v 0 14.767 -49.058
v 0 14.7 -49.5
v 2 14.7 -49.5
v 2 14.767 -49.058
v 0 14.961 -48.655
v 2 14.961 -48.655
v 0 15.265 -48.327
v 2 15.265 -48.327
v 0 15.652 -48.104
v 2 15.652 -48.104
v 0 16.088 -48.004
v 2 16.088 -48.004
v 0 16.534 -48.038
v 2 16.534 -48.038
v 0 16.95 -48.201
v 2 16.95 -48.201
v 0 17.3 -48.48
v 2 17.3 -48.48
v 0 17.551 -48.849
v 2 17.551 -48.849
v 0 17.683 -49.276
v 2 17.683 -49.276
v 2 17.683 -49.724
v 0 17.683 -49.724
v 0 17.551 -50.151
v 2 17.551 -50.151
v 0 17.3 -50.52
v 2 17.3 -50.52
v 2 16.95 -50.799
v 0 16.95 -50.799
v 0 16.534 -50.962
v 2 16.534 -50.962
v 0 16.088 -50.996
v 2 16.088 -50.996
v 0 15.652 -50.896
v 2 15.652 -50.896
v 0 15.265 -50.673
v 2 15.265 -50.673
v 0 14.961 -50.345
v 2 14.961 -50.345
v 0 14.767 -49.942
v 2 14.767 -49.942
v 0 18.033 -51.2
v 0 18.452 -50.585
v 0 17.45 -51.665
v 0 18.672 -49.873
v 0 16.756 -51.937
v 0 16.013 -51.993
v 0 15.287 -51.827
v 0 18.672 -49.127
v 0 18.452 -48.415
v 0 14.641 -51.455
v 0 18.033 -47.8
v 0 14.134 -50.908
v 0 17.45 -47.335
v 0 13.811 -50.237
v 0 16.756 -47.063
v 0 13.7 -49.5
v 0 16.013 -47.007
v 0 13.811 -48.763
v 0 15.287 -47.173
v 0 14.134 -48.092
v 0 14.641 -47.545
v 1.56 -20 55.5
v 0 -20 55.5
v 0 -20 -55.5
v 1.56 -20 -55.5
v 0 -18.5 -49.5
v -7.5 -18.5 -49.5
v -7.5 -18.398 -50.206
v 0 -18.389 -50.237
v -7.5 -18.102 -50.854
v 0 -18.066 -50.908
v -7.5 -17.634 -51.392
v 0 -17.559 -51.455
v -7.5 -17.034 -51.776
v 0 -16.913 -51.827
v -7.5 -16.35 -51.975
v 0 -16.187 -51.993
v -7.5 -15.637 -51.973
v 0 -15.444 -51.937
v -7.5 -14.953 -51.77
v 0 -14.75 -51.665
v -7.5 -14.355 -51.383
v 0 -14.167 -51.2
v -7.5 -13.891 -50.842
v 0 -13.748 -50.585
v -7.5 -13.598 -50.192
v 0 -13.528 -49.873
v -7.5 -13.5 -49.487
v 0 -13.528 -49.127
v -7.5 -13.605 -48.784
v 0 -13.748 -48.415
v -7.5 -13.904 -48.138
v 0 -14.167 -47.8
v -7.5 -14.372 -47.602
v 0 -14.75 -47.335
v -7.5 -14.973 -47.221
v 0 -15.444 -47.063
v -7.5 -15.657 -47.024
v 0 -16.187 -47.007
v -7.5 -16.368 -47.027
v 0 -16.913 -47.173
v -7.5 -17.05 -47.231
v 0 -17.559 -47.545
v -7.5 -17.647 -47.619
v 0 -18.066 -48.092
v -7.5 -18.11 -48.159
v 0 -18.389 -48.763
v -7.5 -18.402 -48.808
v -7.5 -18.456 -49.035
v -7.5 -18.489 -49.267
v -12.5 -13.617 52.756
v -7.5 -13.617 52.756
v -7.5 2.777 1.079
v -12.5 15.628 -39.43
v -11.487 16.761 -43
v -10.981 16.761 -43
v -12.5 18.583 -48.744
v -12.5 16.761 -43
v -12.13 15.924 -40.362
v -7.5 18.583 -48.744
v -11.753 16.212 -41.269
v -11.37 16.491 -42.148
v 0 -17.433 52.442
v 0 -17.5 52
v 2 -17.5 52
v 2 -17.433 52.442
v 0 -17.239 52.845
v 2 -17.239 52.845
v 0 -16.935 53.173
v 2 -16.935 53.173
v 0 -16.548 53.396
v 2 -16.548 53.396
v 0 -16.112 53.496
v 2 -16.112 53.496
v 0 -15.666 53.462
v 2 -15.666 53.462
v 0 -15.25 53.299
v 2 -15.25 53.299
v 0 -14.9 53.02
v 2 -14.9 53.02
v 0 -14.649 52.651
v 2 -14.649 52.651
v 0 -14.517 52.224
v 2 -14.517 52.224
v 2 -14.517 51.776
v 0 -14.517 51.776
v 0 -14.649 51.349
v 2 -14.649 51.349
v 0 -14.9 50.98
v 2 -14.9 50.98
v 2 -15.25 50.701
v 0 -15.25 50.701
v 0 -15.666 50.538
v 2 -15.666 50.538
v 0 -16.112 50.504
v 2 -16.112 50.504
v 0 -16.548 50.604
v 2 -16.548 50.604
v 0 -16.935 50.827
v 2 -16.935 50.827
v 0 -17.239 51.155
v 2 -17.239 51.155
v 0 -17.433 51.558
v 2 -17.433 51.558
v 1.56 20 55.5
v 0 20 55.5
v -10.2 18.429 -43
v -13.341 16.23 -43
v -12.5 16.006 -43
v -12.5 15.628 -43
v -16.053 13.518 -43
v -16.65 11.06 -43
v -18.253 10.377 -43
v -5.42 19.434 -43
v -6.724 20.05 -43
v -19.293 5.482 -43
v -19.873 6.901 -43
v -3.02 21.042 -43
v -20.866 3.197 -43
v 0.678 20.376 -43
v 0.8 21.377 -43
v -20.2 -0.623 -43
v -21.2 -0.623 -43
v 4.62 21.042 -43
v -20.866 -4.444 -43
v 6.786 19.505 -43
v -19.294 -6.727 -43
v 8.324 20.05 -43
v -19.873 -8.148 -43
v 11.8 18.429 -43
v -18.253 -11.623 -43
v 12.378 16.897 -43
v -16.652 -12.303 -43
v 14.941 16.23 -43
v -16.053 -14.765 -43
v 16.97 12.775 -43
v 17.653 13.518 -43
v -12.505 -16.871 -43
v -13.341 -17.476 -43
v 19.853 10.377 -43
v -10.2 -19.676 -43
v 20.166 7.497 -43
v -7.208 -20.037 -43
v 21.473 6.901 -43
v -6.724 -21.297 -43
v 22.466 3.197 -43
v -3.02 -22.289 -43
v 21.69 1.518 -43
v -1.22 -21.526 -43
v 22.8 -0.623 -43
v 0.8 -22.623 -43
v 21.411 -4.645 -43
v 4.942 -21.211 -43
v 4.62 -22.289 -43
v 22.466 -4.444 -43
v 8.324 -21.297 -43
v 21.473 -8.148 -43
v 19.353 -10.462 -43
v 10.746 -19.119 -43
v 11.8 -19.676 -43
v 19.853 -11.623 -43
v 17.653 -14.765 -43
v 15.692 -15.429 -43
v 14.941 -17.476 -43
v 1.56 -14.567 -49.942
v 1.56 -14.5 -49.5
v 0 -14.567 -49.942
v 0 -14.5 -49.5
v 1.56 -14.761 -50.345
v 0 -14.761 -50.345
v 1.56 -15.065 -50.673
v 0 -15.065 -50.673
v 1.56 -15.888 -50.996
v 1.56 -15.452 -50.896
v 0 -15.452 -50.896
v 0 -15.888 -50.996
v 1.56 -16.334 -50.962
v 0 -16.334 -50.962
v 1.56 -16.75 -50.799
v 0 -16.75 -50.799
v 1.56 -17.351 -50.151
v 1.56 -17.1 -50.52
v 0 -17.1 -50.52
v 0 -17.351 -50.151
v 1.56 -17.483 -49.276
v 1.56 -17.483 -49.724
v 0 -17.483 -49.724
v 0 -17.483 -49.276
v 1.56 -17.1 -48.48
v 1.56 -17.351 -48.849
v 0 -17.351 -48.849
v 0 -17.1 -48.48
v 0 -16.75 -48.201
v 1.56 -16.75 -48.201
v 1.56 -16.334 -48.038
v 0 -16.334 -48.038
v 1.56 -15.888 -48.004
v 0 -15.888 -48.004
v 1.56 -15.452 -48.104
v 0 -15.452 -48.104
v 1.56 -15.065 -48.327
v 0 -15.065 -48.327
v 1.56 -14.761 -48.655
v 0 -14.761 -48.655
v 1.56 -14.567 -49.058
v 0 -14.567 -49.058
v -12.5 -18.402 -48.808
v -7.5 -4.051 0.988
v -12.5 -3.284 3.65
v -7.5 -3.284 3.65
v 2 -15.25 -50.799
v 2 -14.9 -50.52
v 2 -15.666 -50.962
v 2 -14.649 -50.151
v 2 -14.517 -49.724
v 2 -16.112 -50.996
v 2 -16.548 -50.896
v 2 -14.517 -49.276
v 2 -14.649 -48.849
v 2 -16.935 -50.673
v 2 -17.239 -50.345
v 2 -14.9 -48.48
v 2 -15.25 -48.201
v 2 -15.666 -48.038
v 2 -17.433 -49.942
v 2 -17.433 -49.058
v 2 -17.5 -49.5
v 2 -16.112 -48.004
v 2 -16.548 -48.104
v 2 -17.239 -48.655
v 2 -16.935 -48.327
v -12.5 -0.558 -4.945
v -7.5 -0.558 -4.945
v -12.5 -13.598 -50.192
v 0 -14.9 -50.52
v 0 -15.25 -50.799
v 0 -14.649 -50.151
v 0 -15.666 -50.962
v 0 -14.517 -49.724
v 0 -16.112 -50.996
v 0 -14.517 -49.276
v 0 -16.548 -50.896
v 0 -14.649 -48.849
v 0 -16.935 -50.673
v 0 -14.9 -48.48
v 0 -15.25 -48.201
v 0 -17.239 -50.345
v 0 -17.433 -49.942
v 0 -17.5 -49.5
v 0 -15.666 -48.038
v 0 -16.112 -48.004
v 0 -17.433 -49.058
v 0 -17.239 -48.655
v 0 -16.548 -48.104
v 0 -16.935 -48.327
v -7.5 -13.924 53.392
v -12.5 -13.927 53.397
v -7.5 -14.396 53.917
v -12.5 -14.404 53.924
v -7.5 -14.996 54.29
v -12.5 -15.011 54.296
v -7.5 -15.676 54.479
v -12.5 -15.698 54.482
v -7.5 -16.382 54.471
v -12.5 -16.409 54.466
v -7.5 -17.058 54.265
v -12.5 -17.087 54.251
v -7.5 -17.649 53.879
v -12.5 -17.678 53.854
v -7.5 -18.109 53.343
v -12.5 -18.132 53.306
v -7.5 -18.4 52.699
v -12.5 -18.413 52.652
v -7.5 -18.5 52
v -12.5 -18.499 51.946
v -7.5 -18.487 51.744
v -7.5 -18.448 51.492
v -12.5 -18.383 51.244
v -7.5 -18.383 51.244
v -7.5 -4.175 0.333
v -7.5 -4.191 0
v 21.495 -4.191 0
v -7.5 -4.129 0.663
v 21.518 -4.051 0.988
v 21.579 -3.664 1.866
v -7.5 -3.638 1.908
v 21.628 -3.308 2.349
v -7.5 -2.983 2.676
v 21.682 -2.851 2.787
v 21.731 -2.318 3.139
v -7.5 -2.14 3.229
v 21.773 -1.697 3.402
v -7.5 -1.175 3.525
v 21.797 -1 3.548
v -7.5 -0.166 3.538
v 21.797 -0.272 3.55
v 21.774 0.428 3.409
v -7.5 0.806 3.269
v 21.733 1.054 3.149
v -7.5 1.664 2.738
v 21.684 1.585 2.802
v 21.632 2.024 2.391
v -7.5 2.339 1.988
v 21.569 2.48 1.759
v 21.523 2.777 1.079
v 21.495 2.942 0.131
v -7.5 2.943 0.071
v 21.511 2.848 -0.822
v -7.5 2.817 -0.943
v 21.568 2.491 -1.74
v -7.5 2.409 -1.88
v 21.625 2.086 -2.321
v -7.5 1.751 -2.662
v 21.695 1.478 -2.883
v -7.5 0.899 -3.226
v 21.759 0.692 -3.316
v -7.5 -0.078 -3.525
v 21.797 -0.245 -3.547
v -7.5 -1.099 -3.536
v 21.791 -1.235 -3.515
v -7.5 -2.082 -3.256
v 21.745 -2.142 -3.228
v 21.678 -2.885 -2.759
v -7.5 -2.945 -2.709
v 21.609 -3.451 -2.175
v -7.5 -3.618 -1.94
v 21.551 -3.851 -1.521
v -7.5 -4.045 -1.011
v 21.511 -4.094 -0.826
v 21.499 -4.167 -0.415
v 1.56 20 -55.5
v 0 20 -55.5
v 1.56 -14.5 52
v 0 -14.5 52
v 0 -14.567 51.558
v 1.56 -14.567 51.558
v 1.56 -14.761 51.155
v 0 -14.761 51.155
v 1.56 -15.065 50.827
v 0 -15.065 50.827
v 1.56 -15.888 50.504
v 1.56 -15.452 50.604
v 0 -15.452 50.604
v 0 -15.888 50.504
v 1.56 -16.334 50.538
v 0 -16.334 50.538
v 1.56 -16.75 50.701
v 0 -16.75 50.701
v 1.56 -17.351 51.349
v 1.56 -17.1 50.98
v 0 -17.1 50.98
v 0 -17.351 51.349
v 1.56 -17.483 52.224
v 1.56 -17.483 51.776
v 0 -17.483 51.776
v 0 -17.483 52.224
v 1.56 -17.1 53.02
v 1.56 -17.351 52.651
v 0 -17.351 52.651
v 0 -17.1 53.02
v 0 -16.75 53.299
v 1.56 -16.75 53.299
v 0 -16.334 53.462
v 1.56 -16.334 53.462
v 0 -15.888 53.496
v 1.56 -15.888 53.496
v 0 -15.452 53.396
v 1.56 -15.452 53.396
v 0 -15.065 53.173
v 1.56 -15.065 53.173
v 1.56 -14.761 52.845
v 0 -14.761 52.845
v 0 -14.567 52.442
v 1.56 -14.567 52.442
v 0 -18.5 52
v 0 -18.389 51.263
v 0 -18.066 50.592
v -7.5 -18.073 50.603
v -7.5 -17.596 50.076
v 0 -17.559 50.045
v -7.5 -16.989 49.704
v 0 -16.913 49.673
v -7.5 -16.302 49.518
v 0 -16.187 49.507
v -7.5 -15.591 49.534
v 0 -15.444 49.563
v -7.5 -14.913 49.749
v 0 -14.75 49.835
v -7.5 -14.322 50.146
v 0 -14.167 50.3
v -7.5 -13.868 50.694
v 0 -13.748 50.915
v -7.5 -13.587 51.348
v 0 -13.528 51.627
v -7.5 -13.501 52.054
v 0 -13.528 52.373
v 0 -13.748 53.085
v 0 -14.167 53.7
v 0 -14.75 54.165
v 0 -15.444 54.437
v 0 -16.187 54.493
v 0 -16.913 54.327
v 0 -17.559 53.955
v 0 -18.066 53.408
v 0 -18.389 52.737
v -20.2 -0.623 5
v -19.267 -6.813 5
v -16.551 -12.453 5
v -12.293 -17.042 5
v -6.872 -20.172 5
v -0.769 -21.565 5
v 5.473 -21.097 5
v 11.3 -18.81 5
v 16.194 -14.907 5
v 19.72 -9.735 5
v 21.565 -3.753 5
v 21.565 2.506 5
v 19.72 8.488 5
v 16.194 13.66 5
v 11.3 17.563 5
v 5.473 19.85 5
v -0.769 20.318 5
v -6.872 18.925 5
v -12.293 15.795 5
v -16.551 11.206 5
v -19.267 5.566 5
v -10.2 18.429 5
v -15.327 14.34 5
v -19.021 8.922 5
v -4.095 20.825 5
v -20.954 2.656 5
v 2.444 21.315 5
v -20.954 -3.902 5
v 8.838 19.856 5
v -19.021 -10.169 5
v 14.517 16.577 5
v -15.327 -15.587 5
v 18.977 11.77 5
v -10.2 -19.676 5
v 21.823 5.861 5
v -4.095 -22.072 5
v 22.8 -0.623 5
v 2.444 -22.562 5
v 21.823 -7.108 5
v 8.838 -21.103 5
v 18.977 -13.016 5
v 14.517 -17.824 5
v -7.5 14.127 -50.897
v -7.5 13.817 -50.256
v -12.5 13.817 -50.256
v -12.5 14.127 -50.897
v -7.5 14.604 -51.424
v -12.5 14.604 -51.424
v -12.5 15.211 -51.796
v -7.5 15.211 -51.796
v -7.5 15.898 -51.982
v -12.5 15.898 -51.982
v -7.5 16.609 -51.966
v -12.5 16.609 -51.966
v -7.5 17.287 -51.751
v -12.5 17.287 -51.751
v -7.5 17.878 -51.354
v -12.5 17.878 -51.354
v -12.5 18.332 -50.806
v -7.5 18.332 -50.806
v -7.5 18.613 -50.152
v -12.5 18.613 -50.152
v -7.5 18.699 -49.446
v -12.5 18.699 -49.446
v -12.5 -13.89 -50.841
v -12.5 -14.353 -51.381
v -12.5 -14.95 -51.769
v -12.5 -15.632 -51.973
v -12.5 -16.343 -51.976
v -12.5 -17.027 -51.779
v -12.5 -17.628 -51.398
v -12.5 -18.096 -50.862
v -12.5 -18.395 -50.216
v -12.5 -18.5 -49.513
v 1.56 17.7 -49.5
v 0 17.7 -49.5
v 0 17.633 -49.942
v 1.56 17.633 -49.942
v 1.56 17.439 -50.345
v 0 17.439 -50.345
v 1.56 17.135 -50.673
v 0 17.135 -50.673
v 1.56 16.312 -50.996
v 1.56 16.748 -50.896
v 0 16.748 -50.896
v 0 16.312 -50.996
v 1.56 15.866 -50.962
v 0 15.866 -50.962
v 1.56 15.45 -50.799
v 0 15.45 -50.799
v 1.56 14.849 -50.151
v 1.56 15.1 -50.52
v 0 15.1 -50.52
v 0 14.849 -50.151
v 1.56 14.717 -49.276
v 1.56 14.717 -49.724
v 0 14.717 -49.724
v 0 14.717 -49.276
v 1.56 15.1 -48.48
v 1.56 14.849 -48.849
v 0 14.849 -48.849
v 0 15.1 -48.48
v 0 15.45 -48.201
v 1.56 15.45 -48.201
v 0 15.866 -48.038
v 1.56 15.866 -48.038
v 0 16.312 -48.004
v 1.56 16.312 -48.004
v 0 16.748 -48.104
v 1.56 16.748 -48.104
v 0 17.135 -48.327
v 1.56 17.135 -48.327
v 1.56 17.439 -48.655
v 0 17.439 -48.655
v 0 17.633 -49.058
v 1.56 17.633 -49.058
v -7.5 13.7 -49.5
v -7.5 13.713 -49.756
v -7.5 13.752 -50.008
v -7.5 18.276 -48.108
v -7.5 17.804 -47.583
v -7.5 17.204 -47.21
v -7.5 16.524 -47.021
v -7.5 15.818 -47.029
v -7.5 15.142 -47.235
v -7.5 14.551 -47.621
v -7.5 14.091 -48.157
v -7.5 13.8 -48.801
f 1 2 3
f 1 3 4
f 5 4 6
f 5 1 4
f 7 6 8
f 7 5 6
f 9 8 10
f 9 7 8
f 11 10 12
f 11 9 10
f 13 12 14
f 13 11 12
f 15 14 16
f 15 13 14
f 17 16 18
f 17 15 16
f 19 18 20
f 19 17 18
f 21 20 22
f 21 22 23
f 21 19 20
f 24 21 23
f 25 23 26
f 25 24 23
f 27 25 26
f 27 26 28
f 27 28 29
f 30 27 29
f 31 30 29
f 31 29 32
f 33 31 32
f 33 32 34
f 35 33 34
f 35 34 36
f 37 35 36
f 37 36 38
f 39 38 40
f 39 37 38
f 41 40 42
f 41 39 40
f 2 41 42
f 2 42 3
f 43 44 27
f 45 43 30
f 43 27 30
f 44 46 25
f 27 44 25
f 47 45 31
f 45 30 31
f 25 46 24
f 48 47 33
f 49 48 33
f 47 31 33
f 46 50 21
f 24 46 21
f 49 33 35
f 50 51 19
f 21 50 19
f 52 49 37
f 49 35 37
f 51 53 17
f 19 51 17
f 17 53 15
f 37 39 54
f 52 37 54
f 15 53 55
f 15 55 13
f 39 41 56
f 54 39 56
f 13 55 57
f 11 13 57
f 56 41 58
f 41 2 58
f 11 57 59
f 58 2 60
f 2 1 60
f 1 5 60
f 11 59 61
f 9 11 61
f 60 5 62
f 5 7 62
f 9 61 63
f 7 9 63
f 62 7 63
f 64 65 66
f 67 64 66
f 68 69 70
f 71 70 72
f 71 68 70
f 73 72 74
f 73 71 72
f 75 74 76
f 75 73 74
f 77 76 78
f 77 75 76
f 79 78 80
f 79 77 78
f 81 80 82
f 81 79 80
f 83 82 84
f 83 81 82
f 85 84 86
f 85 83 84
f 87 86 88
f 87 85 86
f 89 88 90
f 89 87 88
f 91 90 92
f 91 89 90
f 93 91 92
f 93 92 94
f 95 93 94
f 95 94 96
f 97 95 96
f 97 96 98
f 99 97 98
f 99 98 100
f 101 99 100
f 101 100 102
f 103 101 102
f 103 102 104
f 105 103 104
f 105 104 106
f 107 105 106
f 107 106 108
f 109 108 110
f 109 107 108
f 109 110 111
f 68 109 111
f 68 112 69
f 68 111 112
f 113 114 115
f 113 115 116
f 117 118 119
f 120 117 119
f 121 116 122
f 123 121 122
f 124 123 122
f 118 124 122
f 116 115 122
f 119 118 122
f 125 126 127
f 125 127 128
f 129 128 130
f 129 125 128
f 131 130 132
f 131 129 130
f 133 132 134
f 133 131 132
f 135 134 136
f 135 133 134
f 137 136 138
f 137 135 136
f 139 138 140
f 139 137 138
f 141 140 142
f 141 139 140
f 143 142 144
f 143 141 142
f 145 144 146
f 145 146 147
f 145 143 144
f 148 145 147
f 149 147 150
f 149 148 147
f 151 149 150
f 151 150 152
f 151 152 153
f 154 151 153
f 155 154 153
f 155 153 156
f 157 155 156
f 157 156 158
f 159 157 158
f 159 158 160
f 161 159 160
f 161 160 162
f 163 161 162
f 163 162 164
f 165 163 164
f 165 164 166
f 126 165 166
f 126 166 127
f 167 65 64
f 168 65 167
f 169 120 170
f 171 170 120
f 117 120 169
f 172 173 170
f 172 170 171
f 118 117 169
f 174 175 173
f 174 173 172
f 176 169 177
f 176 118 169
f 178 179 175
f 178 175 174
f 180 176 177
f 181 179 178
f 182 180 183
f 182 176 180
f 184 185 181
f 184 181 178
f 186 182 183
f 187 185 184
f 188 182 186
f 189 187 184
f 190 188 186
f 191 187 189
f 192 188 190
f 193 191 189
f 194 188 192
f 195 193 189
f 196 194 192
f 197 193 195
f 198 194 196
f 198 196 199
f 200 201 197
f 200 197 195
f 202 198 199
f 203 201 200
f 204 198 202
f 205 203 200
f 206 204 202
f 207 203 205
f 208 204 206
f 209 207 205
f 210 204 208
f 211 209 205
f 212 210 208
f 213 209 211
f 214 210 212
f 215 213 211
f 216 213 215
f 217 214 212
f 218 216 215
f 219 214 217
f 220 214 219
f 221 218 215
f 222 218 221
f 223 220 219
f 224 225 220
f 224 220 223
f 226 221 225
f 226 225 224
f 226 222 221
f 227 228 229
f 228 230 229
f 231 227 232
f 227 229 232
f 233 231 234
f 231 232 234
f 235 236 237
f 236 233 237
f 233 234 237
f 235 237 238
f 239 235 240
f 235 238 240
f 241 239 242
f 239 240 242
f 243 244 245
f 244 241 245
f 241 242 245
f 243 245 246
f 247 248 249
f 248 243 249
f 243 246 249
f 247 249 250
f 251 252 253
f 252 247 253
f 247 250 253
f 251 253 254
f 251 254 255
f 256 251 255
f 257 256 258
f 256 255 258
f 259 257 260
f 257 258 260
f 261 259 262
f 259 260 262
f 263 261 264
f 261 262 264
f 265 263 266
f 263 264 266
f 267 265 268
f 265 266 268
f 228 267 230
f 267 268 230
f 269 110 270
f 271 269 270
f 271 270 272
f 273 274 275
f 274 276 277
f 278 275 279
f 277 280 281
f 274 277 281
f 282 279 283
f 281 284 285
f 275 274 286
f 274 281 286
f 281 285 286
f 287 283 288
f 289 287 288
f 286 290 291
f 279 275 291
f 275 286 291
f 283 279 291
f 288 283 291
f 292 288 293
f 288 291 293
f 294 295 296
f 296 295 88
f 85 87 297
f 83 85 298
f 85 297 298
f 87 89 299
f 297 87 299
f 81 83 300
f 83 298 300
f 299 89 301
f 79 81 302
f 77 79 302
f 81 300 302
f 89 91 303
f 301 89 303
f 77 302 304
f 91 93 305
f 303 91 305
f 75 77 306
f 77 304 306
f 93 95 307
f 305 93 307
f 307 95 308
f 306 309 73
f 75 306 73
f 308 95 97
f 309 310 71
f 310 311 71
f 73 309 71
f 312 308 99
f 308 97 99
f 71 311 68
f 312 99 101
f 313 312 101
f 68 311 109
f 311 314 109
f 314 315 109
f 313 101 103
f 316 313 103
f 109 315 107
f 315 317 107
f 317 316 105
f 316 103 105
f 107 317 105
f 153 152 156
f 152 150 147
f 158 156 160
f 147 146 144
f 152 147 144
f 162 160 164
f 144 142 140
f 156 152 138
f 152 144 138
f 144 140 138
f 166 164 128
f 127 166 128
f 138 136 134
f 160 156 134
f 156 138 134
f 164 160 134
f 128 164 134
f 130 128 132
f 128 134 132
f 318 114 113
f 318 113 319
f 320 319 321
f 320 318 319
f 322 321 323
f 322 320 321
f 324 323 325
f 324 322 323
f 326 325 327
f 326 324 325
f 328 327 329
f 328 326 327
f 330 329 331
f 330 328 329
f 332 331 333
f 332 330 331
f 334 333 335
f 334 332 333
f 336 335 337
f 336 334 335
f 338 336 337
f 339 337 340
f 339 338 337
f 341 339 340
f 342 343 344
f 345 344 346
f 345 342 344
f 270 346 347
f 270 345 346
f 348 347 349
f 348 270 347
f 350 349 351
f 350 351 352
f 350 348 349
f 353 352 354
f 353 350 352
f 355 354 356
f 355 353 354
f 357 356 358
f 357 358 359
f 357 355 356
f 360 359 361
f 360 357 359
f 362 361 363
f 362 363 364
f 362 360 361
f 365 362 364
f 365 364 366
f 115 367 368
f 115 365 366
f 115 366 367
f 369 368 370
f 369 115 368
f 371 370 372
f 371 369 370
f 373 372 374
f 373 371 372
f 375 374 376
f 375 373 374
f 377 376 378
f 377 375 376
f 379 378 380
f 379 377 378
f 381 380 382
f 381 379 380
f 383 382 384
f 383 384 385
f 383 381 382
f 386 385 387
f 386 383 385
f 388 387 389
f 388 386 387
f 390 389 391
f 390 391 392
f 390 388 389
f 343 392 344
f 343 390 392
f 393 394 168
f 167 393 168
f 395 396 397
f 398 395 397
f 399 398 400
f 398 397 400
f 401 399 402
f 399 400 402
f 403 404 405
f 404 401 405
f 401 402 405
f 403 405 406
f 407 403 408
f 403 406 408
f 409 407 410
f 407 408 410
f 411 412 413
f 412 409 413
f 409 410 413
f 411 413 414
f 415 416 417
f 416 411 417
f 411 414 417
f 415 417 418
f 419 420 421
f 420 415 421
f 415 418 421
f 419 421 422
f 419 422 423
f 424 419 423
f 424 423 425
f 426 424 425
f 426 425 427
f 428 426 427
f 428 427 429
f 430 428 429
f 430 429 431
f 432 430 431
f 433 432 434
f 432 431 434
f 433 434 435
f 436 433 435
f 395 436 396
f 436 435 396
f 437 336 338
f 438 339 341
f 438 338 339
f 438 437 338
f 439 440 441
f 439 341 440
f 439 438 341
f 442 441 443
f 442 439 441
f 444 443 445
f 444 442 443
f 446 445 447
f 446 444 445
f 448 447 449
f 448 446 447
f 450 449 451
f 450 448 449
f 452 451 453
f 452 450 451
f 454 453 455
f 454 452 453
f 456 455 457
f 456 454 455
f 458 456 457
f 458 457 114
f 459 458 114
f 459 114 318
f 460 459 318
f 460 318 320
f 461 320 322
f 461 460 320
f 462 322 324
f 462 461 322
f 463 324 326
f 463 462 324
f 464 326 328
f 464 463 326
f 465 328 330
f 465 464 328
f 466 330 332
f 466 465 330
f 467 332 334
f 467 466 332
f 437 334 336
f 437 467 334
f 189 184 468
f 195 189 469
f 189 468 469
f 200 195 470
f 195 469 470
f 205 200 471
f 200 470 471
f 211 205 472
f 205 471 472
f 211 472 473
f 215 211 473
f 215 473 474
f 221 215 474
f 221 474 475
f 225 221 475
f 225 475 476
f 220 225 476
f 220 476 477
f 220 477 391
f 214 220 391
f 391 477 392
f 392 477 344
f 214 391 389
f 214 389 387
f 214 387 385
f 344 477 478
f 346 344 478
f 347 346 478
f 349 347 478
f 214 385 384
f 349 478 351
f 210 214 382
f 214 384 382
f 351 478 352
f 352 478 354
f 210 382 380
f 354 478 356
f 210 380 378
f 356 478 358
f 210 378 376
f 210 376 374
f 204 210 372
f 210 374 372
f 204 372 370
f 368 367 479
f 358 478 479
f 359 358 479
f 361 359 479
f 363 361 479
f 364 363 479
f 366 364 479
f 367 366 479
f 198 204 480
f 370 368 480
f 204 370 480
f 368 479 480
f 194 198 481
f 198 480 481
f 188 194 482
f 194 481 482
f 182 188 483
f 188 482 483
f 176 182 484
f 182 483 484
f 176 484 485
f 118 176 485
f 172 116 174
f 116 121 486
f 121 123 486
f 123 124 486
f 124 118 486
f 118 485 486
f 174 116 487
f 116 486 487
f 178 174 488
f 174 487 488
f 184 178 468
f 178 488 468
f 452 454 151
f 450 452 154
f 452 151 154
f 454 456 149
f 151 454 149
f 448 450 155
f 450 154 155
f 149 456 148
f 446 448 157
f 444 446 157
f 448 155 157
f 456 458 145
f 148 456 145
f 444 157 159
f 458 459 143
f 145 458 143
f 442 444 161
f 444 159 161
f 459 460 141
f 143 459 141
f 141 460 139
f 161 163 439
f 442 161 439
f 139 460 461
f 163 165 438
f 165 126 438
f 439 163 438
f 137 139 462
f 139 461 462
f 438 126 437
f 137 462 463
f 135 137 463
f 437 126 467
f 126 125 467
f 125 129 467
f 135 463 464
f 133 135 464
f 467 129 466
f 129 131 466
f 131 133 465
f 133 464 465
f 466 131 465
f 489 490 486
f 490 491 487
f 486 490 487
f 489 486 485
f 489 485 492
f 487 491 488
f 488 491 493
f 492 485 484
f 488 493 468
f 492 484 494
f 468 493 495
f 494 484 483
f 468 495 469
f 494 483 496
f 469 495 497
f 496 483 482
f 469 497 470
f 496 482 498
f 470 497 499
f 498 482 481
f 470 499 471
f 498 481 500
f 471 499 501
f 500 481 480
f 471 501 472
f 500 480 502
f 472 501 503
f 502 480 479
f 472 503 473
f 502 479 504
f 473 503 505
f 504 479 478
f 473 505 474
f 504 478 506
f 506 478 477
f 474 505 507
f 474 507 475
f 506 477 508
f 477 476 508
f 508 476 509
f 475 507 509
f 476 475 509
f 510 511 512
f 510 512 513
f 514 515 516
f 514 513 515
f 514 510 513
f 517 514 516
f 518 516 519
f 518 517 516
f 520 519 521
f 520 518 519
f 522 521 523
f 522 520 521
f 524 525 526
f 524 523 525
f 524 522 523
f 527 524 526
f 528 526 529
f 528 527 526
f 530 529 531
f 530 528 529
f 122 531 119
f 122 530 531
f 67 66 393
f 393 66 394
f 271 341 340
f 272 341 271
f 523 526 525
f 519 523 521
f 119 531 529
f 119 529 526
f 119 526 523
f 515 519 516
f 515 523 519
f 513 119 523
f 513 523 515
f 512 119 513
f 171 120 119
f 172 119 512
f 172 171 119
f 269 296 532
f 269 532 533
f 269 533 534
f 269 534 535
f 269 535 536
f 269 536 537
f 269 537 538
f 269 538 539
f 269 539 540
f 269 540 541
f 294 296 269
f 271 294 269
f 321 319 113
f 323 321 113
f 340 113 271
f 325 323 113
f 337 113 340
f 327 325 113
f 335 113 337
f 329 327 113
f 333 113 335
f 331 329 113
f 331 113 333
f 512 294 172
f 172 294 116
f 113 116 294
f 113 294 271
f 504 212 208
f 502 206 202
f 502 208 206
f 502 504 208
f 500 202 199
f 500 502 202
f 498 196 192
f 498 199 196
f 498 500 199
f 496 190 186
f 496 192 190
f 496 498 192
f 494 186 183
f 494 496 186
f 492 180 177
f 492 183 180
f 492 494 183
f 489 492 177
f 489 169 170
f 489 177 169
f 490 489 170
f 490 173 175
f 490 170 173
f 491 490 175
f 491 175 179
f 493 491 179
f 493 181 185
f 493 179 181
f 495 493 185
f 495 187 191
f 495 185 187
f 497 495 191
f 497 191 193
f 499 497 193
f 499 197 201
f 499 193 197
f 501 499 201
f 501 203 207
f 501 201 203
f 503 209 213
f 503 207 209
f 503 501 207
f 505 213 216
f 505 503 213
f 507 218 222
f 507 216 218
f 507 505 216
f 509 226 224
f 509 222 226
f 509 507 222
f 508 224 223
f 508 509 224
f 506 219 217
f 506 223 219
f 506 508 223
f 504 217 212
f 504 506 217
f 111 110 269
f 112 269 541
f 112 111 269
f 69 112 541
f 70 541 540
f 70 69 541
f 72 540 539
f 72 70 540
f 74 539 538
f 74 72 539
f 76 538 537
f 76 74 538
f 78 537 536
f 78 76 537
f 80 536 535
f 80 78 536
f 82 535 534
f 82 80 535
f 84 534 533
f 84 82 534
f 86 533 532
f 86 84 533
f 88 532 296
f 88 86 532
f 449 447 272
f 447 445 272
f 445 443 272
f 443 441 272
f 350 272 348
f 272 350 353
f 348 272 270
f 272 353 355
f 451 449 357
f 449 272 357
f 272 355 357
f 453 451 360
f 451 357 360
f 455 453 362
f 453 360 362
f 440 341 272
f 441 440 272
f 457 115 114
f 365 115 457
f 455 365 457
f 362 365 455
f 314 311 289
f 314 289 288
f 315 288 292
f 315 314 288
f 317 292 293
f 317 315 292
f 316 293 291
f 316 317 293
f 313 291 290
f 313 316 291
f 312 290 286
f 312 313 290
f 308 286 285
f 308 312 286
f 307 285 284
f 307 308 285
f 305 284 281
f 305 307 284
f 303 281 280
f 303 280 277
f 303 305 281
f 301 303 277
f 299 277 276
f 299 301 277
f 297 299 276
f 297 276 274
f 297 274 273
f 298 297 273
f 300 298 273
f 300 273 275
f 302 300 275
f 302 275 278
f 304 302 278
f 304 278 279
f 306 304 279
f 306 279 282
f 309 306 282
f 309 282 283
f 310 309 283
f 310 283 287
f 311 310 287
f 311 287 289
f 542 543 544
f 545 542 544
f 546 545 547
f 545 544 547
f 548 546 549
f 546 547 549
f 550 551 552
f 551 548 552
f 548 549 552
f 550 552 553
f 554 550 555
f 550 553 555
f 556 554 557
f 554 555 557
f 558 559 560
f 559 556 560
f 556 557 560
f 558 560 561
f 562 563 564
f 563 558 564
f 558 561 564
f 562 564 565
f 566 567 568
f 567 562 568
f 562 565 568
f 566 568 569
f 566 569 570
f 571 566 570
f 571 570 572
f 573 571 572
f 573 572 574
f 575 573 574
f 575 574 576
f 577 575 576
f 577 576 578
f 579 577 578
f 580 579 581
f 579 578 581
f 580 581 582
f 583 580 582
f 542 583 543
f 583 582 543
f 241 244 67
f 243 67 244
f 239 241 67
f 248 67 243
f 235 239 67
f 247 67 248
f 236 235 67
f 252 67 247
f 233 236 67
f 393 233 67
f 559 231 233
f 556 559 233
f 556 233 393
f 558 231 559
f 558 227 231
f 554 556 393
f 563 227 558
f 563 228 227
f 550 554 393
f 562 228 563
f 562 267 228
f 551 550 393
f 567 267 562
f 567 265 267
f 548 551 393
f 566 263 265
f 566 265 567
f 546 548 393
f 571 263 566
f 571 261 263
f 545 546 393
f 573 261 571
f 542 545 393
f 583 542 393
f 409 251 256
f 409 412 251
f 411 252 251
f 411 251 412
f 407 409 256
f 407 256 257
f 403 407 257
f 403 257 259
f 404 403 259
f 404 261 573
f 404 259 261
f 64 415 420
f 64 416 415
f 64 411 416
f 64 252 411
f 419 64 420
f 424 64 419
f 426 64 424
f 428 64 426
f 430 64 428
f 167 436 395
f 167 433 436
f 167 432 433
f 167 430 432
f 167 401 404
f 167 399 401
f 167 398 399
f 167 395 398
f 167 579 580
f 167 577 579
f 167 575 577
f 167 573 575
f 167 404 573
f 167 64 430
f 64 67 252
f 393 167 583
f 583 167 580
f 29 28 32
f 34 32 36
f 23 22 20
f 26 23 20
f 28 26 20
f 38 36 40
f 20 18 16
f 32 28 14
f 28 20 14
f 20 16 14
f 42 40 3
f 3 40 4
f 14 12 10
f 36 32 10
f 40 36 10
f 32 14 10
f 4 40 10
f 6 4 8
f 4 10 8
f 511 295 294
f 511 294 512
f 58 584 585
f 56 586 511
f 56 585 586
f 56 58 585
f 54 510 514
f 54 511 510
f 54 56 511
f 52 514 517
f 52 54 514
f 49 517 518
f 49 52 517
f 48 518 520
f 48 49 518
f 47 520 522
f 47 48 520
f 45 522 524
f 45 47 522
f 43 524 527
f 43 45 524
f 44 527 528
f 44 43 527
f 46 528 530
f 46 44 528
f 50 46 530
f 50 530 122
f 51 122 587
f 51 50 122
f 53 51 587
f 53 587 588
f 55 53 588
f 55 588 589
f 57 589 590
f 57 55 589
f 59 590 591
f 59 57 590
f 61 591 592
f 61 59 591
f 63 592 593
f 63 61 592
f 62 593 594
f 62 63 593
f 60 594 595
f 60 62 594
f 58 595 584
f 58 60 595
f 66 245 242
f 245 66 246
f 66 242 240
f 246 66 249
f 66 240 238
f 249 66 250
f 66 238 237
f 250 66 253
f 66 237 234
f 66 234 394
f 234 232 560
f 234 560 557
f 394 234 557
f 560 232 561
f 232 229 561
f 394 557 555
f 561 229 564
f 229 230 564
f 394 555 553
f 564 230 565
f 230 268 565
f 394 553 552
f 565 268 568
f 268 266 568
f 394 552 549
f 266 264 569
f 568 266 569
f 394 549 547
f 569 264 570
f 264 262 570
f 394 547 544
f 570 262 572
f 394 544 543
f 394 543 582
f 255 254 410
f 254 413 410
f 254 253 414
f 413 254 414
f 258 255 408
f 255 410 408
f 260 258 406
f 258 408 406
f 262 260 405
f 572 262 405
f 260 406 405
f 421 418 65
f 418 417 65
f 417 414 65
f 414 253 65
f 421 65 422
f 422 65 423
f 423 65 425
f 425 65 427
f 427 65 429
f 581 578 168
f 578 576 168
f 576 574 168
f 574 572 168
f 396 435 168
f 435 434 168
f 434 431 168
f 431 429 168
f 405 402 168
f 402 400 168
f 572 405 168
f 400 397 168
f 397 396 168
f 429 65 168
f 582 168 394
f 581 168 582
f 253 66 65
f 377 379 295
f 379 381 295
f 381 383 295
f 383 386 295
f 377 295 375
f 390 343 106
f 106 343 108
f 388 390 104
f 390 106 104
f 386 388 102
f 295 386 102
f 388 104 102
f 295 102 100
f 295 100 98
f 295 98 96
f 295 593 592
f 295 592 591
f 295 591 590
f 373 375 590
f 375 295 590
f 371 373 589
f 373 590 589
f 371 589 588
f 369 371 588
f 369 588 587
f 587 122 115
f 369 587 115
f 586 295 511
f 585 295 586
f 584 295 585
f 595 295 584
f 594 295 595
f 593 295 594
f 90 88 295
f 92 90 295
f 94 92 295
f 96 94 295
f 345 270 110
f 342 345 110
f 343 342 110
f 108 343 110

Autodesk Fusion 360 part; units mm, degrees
sketch "Sketch1" plane through (0, 0, 0) normal (1, 0, 0) x (0, 1, 0) in component "chipshouter pcb"
  line L0 (-20, 55.5) -> (20, 55.5)
  line L1 (-20, 55.5) -> (-20, -55.5)
  line L2 (-20, -55.5) -> (20, -55.5)
  line L3 (20, -55.5) -> (20, 55.5)
  line L4 (20, 55.5) -> (-20, -55.5) construction
  circle A0 centre (-16, 52) radius 1.5
  circle A1 centre (-16, -49.5) radius 1.5
  circle A2 centre (16.2, -49.5) radius 1.5
  dimension "d1" = 40
  dimension "d2" = 111
  dimension "d3" = 3
  dimension "d5" = 3.5
  dimension "d6" = 4
  dimension "d7" = 3
  dimension "d8" = 6
  dimension "d9" = 4
  dimension "d10" = 3
  dimension "d11" = 6
  dimension "d12" = 3.8
extrude "Extrude1" add sketch "Sketch1" along normal blind 1.56 makes body 1 in component "chipshouter pcb"
sketch "Sketch2" plane through (0, 0, 0) normal (-1, 0, 0) x (0, -1, 0) in component "pcb holder"
  circle A0 centre (-16.2, -49.5) radius 1.5
  circle A1 centre (16, -49.5) radius 1.5
  circle A2 centre (16, 52) radius 1.5
  line L0 (20, -55.5) -> (20, 55.5)
  line L1 (20, 55.5) -> (-20, 55.5)
  line L2 (-20, 55.5) -> (-20, -55.5)
  line L3 (-20, -55.5) -> (20, -55.5)
  circle A3 centre (16, 52) radius 1.5
  circle A4 centre (16, -49.5) radius 1.5
  circle A5 centre (-16.2, -49.5) radius 1.5
  dimension "d15" = 3
  dimension "d16" = 3
  dimension "d17" = 3
extrude "Extrude1'" add sketch "Sketch2" against normal blind 2 separate body contours A2 A3 makes body 2 in component "pcb holder"
extrude "Extrude2" add sketch "Sketch2" against normal blind 2 separate body contours A1 A4 makes body 3 in component "pcb holder"
extrude "Extrude3" add sketch "Sketch2" against normal blind 2 separate body contours A0 A5 makes body 4 in component "pcb holder"
sketch "Sketch3" plane through (0, 0, 0) normal (-1, 0, 0) x (0, -1, 0) in component "pcb holder"
  circle A0 centre (16, 52) radius 2.5
  circle A1 centre (16, -49.5) radius 2.5
  circle A2 centre (-16.2, -49.5) radius 2.5
  point P0 (16, 52)
  point P1 (16, -49.5)
  point P2 (-16.2, -49.5)
  dimension "d24" = 5
  dimension "d25" = 5
  dimension "d26" = 5
extrude "Extrude4" add sketch "Sketch3" along normal blind 7.5 contours A2 bodies 4 in component "pcb holder"
extrude "Extrude5" add sketch "Sketch3" along normal blind 7.5 contours A1 bodies 3 in component "pcb holder"
extrude "Extrude6" add sketch "Sketch3" along normal blind 7.5 contours A0 bodies 2 in component "pcb holder"
sketch "Sketch5" plane through (-7.5, 0, 0) normal (-1, 0, 0) x (0, -1, 0) in component "pcb holder"
  circle A0 centre (16, 52) radius 2.5
  point P0 (16, 52)
sketch "Sketch6" plane through (-7.5, 0, 0) normal (-1, 0, 0) x (0, -1, 0) in component "pcb holder"
  circle A0 centre (16, -49.5) radius 2.5
  point P0 (16, -49.5)
sketch "Sketch7" plane through (-7.5, 0, 0) normal (-1, 0, 0) x (0, -1, 0) in component "pcb holder"
  circle A0 centre (-16.2, -49.5) radius 2.5
  point P0 (-16.2, -49.5)
ref_plane "WorkPlane1" through (-7.5, -16, 52) normal (-1, 0, 0) x (0, -1, 0) in component "pcb holder"
sketch "Sketch8" plane through (-7.5, -17.5, 53.5) normal (-1, 0, 0) x (0, 1, 0) in component "pcb holder"
  line L0 (-0.883, 2.256) -> (31.317, 103.756) construction
  line L1 (3.883, 0.744) -> (36.083, 102.244)
  circle A0 centre (1.5, 1.5) radius 2.5 construction
  circle A1 centre (33.7, 103) radius 2.5 construction
  line L2 (0, 0) -> (33.7, 103) construction
  circle A2 centre (16.85, 51.5) radius 2.0119 construction
  circle A3 centre (1.5, 103) radius 2.5 construction
  line L3 (3.9022, 103.6923) -> (18.7832, 52.0571) construction
  circle A4 centre (1.5, 103) radius 2.5 construction
  line L4 (16.9424, 58.4446) -> (3.9022, 103.6923)
  line L5 (-0.9022, 102.3077) -> (14.2158, 49.85)
  line L6 (16.9424, 58.4446) -> (31.317, 103.756)
  line L7 (-0.883, 2.256) -> (14.2158, 49.85)
  arc A5 (-0.883, 2.256) -> (3.883, 0.744) centre (1.5, 1.5) ccw
  arc A6 (36.083, 102.244) -> (31.317, 103.756) centre (33.7, 103) ccw
  arc A7 (3.9022, 103.6923) -> (-0.9022, 102.3077) centre (1.5, 103) ccw
  point P0 (16.85, 51.5)
extrude "Extrude7" add sketch "Sketch8" along normal blind 5 bodies 2 3 4 in component "pcb holder"
sketch "Sketch9" plane through (-12.5, 0, 0) normal (-1, 0, 0) x (0, -1, 0) in component "pcb holder"
  line L0 (0.5576, -4.9446) -> (13.5978, -50.1923)
  arc A0 (13.5978, -50.1923) -> (18.4022, -48.8077) centre (16, -49.5) ccw
  line L1 (18.4022, -48.8077) -> (3.2842, 3.65)
  line L2 (3.2842, 3.65) -> (18.383, 51.244)
  arc A1 (18.383, 51.244) -> (13.617, 52.756) centre (16, 52) ccw
  line L3 (13.617, 52.756) -> (-18.583, -48.744)
  arc A2 (-18.583, -48.744) -> (-13.817, -50.256) centre (-16.2, -49.5) ccw
  line L4 (-13.817, -50.256) -> (0.5576, -4.9446)
  circle A3 centre (0.6234, 0) radius 3.5675
  line L5 (0.6234, 0) -> (-3.1193, 0) construction
  point P0 (0.6234, 0)
sketch "Sketch10" plane through (0, 2.8341, 0.8991) normal (0, 0.9532, 0.3024) x (-1, 0, 0) in component "pcb holder"
  line L0 (7.5, 54.4038) -> (7.5, -52.0813)
  line L1 (7.5, -52.0813) -> (12.5, -52.0813)
  line L2 (12.5, -52.0813) -> (12.5, 54.4038)
  line L3 (12.5, 54.4038) -> (7.5, 54.4038)
  line L4 (12.5, -0.9433) -> (7.5, -0.9433) construction
  point P0 (12.5, 0.1885)
  point P1 (12.5, -0.9433)
ref_plane "WorkPlane2" through (-12.5, -0.6234, 0) normal (0, 0, -1) x (-1, 0, 0) in component "pcb holder"
sketch "Sketch11" plane through (-12.5, -0.6234, 0) normal (0, 0, -1) x (1, 0, 0) in component "pcb holder"
  circle A0 centre (13.3, 0) radius 22
  line L0 (0, 0) -> (13.3, 0) construction
  dimension "d35" = 44
  dimension "d49" = 13.3
extrude "Extrude8" add sketch "Sketch11" along normal blind 43 separate body makes body 5 in component "pcb holder"
extrude "Extrude9" add 1 faces at (2.4318, 6.5261, 0) along direction (0, 0, 1) blind 5 on bodies 5 bodies 5 in component "pcb holder"
sketch "Sketch12" plane through (0, 0, 5) normal (0, 0, 1) x (-1, 0, 0) in component "pcb holder"
  circle A0 centre (-0.8, 0.6234) radius 22
  circle A1 centre (-0.8, 0.6234) radius 21
  dimension "d42" = 42
extrude "Extrude10" cut sketch "Sketch12" against normal up to surface (48 mm away) contours A1 bodies 5 in component "pcb holder"
extrude "Extrude11" add sketch "Sketch9" along normal up to surface contours A3 end surface at (22.7727, 0.4732, -28.6667) on bodies 5 bodies 5 2 in component "pcb holder"
component "chipshouter pcb" placed x (1, 0, 0) y (0, 1, 0) z (0, 0, 1) at (0, 0, 0)
component "pcb holder" placed x (1, 0, 0) y (0, 1, 0) z (0, 0, 1) at (0, 0, 0)
equation "d3 = pcb_hole_diameter"
equation "d5 = 2 mm + ( pcb_hole_diameter / 2 mm ) * 1 mm"
equation "d6 = 2.5 mm + ( pcb_hole_diameter / 2 mm ) * 1 mm"
equation "d7 = pcb_hole_diameter"
equation "d8 = 4.5 mm + pcb_hole_diameter / 2"
equation "d9 = 2.5 mm + pcb_hole_diameter / 2"
equation "d10 = pcb_hole_diameter"
equation "d11 = 4.5 mm + pcb_hole_diameter / 2"
equation "d12 = 2.3 mm + pcb_hole_diameter / 2"
equation "pcb_hole_diameter = 3 mm"
